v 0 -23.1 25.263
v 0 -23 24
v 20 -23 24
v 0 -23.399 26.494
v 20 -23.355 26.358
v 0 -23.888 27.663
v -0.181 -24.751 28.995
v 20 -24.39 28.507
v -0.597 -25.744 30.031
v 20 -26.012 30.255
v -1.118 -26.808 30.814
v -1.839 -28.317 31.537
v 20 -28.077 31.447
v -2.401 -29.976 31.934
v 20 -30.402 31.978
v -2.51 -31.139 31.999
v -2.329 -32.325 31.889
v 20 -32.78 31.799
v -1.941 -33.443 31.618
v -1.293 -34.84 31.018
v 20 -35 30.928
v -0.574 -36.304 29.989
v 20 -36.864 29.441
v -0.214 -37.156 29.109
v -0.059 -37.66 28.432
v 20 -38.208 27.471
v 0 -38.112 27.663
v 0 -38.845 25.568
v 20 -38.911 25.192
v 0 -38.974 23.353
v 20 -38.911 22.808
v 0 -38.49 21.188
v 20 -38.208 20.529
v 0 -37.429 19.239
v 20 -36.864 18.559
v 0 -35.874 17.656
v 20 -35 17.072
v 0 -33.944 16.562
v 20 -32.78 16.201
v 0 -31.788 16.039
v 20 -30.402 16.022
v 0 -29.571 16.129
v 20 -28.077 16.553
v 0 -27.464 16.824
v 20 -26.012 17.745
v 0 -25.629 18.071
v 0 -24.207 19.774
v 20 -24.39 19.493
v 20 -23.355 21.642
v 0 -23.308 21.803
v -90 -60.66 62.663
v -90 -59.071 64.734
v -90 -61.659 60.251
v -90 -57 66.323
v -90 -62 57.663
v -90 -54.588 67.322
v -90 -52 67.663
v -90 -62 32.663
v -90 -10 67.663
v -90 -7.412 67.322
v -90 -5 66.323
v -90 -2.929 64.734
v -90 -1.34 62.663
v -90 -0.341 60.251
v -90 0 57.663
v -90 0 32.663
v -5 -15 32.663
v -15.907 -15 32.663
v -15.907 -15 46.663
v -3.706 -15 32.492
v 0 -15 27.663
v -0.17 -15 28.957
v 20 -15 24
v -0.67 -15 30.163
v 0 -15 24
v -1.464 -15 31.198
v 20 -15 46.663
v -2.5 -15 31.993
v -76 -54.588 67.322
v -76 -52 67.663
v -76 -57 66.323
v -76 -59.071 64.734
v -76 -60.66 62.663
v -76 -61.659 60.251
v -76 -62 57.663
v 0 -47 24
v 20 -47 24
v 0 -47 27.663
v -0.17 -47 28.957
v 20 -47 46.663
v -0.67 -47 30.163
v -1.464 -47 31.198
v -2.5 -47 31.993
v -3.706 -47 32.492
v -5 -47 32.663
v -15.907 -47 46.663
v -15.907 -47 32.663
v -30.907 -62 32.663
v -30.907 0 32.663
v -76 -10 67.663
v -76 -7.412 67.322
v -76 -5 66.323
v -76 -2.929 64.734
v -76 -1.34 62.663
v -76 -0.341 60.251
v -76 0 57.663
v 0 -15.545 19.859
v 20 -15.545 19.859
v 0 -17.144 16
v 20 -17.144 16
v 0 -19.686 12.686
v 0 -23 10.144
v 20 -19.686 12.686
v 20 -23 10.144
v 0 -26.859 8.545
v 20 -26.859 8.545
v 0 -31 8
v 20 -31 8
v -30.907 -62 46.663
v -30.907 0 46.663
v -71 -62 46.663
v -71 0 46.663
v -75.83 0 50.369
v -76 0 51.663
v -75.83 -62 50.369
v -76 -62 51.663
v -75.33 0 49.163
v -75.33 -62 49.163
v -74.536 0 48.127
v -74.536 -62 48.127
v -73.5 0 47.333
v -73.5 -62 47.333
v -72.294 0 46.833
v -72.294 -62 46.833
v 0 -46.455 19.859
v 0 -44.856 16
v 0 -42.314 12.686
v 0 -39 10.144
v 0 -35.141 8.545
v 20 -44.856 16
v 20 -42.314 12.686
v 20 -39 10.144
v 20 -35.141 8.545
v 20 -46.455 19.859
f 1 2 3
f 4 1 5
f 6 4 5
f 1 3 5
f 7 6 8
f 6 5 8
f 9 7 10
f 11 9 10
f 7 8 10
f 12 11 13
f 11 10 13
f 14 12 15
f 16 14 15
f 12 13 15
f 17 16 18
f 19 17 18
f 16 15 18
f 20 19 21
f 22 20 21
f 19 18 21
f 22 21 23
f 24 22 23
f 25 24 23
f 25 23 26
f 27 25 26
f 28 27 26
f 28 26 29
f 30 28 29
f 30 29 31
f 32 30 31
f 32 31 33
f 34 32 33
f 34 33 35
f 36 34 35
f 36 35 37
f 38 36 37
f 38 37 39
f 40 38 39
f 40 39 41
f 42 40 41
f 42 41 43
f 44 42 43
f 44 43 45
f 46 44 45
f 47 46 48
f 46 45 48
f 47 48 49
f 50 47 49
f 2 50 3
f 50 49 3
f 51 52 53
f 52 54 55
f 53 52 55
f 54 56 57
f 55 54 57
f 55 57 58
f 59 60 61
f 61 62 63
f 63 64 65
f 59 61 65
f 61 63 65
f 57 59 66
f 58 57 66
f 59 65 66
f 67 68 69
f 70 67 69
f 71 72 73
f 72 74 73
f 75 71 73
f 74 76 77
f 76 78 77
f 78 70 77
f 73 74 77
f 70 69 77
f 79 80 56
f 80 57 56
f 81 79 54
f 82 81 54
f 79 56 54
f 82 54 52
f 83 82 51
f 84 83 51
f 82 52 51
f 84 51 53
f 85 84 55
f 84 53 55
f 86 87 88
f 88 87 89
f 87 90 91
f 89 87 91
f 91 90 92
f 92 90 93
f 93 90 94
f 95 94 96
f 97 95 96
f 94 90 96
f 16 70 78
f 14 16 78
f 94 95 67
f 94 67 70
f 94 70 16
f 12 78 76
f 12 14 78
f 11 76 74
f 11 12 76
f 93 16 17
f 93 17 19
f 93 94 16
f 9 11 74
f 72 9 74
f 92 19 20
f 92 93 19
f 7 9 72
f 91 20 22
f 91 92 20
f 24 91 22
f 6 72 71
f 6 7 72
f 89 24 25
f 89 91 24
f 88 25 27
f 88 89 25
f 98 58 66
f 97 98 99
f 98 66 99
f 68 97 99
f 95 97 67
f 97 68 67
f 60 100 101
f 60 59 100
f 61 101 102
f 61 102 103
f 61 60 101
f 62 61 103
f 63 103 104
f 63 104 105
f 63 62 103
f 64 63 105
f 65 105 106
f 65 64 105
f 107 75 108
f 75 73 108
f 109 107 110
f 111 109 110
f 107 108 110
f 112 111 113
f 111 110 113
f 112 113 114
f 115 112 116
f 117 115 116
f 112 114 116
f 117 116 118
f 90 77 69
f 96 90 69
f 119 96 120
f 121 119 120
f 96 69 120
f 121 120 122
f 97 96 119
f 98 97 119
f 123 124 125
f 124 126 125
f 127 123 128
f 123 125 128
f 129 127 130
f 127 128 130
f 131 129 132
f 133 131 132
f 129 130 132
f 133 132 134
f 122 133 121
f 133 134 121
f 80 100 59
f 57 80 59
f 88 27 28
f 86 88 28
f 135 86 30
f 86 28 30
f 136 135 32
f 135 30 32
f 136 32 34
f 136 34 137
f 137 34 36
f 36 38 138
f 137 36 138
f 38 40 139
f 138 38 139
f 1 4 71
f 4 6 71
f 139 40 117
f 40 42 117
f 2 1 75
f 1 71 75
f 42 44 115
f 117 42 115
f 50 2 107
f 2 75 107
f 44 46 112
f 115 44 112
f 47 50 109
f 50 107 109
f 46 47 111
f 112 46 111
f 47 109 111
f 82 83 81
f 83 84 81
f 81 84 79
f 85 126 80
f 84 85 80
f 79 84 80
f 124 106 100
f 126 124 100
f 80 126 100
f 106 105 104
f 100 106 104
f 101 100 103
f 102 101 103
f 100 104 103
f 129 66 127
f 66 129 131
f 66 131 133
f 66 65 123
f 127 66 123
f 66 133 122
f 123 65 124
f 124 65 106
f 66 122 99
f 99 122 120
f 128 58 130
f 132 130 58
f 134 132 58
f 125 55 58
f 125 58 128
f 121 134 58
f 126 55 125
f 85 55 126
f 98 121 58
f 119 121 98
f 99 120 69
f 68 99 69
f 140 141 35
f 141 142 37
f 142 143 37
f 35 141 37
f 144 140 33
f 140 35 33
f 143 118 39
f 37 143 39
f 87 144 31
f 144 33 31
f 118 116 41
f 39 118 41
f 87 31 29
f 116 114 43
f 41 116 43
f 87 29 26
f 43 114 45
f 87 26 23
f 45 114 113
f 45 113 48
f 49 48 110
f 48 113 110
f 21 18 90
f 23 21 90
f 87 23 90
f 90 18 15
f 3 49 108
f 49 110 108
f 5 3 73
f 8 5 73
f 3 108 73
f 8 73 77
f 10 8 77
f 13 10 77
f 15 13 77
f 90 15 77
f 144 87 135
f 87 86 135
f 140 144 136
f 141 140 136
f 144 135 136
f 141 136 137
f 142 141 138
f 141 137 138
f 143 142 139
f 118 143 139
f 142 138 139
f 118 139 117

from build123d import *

# Parameters (mm, degrees)
F1_DEPTH = 62
F2_R     = 10
F3_R     = 5
F4_R     = 5
F6_DEPTH = 666
F7_R     = 15.99999
F8_R     = 8
F9_DEPTH = 25


# Not quite as in the source:
# - a fillet or chamfer is up to 0.001 mm smaller than in the source, because OpenCascade refuses the exact size


with BuildPart() as f1:
    # F0 (on Front) → F1 (new body)
    with BuildSketch(Plane.XZ):
        Polygon((-76, 67.66280128), (-90, 67.66280128), (-90, 32.66280128), (0, 32.66280128), (0, 8.0000054104), (20, 8.0000054104), (20, 46.66280128), (-76, 46.66280128), align=None)
    extrude(amount=F1_DEPTH)

    # F2
    f2_edges = [f1.edges().sort_by_distance(p)[0] for p in [
        (-83, -62, 67.662801),
        (-83, 0, 67.662801),
    ]]
    fillet(f2_edges, radius=F2_R)

    # F3
    f3_edges = [f1.edges().sort_by_distance(p)[0] for p in [
        (-76, -31, 46.662801),
    ]]
    fillet(f3_edges, radius=F3_R)

    # F4
    f4_edges = [f1.edges().sort_by_distance(p)[0] for p in [
        (0, -31, 32.662801),
    ]]
    fillet(f4_edges, radius=F4_R)

    # F5 (on face) → F6 (cut)
    with BuildSketch(Plane.XY.offset(46.66280128)):
        Polygon((20, -62), (20, -47), (-15.907, -47), (-30.907, -62), align=None)
        Polygon((-15.907, -15), (20, -15), (20, 0), (-30.907, 0), align=None)
    extrude(amount=-F6_DEPTH, mode=Mode.SUBTRACT)

    # F7 (radius 16 in the source; OpenCascade refuses exactly that, so slightly less here)
    f7_edges = [f1.edges().sort_by_distance(p)[0] for p in [
        (10, -47, 8.000005),
        (10, -15, 8.000005),
    ]]
    fillet(f7_edges, radius=F7_R)

    # F8 (on face) → F9 (cut)
    with BuildSketch(Plane.YZ.offset(20)):
        with Locations((-31, 24.0000054104)):
            Circle(F8_R)
    extrude(amount=-F9_DEPTH, mode=Mode.SUBTRACT)


solid = f1.part
